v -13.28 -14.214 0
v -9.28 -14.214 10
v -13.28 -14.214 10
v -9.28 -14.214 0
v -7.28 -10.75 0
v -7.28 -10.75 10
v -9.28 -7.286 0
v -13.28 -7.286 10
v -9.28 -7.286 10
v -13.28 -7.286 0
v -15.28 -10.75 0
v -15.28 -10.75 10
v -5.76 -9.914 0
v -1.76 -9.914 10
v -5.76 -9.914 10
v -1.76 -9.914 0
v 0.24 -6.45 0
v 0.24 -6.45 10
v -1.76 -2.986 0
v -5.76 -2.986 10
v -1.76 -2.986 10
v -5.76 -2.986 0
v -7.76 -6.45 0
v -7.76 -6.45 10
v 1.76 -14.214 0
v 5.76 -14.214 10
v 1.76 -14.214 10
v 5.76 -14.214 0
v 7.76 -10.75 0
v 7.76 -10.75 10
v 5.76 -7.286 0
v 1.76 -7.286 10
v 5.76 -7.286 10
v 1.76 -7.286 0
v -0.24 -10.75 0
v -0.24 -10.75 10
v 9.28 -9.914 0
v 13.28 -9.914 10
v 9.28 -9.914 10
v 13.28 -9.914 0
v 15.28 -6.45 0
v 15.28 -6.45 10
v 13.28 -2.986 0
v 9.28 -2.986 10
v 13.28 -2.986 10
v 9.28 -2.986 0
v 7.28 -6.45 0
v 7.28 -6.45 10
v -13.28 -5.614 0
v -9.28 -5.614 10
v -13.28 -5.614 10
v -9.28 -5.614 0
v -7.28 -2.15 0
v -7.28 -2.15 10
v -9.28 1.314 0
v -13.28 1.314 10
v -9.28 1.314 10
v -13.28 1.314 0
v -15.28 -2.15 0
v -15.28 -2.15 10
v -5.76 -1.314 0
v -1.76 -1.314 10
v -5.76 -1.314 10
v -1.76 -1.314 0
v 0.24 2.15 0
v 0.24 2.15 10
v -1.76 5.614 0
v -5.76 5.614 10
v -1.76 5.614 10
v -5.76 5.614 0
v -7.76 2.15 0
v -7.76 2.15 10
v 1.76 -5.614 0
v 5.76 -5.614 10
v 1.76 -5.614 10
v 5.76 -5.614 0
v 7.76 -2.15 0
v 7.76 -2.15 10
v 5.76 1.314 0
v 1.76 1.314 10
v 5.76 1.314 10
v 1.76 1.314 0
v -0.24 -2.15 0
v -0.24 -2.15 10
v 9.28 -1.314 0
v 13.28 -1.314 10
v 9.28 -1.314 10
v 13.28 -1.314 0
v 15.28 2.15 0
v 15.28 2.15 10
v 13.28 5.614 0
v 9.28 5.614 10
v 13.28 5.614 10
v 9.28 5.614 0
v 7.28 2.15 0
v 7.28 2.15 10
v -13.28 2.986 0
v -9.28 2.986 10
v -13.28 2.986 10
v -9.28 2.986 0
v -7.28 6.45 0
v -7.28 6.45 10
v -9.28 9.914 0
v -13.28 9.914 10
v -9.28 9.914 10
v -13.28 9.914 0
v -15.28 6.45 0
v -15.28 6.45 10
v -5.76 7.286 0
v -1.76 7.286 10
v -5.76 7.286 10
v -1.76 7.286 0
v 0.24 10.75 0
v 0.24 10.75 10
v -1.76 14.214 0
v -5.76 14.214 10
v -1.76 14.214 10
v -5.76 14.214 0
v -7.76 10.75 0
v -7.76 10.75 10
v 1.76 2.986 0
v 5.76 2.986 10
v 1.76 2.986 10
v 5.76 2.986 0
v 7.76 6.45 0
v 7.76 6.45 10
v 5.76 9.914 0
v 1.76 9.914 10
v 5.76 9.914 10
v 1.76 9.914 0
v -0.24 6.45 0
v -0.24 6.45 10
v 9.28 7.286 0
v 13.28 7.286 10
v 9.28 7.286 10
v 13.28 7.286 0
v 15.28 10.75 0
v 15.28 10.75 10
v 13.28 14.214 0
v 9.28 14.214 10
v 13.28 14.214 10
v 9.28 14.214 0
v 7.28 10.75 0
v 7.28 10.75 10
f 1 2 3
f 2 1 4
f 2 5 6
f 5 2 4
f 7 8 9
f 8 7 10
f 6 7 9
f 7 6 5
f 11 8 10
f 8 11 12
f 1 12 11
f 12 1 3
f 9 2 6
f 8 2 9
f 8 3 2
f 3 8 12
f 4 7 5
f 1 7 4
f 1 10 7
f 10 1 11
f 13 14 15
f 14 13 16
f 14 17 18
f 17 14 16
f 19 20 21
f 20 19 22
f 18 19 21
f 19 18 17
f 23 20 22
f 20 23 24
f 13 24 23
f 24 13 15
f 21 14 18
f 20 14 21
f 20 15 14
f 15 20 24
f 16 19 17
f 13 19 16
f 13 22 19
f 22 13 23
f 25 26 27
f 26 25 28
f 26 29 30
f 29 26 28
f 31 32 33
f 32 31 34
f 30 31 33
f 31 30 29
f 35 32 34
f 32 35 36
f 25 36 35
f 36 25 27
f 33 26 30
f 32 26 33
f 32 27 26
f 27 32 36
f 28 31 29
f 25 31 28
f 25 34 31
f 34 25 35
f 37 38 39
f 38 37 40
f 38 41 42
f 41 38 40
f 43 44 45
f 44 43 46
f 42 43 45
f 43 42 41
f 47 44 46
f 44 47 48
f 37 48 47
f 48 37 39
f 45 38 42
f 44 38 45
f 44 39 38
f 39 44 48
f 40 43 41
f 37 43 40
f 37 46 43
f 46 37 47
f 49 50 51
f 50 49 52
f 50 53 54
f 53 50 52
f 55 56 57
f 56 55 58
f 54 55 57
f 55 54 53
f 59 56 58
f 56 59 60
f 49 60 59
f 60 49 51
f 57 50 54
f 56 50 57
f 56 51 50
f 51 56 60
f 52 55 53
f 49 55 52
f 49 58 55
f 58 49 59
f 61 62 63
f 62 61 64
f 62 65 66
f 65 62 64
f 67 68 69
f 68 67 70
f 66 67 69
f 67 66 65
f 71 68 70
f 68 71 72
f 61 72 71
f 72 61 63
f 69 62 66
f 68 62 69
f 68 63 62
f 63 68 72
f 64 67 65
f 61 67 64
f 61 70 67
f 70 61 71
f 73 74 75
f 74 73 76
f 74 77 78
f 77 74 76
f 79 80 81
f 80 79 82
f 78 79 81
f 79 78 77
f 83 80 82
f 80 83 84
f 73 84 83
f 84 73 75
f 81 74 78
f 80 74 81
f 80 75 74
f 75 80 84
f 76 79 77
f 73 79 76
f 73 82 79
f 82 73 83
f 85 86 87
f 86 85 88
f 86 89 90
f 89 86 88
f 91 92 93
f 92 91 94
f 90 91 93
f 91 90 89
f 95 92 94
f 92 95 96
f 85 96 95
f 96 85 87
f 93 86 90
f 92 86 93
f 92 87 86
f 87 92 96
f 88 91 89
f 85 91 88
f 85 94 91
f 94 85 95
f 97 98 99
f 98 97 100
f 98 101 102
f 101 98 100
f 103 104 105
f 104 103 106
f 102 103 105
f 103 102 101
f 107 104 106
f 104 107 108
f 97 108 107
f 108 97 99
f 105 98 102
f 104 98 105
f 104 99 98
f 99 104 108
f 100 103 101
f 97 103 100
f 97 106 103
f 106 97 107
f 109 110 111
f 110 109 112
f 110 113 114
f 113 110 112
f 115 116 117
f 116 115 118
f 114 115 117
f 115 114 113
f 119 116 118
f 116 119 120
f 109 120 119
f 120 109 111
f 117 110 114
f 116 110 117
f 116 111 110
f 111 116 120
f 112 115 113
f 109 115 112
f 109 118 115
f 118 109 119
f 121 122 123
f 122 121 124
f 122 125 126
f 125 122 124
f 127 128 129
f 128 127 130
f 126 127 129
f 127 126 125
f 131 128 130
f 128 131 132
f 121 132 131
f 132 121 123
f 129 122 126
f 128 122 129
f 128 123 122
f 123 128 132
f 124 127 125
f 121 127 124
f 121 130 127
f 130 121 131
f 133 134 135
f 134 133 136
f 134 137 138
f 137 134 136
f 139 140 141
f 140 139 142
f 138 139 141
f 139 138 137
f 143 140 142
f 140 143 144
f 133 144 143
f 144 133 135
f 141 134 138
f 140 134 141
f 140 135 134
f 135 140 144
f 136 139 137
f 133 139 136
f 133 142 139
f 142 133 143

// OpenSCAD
module hexGrid(fillRatio=0.5, gridSize=10, height=1, center=false, rows=3, columns=4) {
    colMulti = 0.752;    
    rowMulti = 0.86;
    offset = [
        (gridSize*colMulti)*((columns-1)/2),
        (gridSize*rowMulti)*((rows-.5)/2),
        0] * -1;
    translate(offset){
        for(row= [0:rows-1]){
            translate([0,gridSize*row*rowMulti,0])
            for(col=[0:columns-1]){
                translate([gridSize*col*colMulti,col%2?(gridSize*rowMulti)/2:0,0])
                cylinder(h=height,d=gridSize*fillRatio, $fn=6, center=center);
            }
            
        }
    }
}

hexGrid(fillRatio=0.8, gridSize=10, height=10, center=false);
